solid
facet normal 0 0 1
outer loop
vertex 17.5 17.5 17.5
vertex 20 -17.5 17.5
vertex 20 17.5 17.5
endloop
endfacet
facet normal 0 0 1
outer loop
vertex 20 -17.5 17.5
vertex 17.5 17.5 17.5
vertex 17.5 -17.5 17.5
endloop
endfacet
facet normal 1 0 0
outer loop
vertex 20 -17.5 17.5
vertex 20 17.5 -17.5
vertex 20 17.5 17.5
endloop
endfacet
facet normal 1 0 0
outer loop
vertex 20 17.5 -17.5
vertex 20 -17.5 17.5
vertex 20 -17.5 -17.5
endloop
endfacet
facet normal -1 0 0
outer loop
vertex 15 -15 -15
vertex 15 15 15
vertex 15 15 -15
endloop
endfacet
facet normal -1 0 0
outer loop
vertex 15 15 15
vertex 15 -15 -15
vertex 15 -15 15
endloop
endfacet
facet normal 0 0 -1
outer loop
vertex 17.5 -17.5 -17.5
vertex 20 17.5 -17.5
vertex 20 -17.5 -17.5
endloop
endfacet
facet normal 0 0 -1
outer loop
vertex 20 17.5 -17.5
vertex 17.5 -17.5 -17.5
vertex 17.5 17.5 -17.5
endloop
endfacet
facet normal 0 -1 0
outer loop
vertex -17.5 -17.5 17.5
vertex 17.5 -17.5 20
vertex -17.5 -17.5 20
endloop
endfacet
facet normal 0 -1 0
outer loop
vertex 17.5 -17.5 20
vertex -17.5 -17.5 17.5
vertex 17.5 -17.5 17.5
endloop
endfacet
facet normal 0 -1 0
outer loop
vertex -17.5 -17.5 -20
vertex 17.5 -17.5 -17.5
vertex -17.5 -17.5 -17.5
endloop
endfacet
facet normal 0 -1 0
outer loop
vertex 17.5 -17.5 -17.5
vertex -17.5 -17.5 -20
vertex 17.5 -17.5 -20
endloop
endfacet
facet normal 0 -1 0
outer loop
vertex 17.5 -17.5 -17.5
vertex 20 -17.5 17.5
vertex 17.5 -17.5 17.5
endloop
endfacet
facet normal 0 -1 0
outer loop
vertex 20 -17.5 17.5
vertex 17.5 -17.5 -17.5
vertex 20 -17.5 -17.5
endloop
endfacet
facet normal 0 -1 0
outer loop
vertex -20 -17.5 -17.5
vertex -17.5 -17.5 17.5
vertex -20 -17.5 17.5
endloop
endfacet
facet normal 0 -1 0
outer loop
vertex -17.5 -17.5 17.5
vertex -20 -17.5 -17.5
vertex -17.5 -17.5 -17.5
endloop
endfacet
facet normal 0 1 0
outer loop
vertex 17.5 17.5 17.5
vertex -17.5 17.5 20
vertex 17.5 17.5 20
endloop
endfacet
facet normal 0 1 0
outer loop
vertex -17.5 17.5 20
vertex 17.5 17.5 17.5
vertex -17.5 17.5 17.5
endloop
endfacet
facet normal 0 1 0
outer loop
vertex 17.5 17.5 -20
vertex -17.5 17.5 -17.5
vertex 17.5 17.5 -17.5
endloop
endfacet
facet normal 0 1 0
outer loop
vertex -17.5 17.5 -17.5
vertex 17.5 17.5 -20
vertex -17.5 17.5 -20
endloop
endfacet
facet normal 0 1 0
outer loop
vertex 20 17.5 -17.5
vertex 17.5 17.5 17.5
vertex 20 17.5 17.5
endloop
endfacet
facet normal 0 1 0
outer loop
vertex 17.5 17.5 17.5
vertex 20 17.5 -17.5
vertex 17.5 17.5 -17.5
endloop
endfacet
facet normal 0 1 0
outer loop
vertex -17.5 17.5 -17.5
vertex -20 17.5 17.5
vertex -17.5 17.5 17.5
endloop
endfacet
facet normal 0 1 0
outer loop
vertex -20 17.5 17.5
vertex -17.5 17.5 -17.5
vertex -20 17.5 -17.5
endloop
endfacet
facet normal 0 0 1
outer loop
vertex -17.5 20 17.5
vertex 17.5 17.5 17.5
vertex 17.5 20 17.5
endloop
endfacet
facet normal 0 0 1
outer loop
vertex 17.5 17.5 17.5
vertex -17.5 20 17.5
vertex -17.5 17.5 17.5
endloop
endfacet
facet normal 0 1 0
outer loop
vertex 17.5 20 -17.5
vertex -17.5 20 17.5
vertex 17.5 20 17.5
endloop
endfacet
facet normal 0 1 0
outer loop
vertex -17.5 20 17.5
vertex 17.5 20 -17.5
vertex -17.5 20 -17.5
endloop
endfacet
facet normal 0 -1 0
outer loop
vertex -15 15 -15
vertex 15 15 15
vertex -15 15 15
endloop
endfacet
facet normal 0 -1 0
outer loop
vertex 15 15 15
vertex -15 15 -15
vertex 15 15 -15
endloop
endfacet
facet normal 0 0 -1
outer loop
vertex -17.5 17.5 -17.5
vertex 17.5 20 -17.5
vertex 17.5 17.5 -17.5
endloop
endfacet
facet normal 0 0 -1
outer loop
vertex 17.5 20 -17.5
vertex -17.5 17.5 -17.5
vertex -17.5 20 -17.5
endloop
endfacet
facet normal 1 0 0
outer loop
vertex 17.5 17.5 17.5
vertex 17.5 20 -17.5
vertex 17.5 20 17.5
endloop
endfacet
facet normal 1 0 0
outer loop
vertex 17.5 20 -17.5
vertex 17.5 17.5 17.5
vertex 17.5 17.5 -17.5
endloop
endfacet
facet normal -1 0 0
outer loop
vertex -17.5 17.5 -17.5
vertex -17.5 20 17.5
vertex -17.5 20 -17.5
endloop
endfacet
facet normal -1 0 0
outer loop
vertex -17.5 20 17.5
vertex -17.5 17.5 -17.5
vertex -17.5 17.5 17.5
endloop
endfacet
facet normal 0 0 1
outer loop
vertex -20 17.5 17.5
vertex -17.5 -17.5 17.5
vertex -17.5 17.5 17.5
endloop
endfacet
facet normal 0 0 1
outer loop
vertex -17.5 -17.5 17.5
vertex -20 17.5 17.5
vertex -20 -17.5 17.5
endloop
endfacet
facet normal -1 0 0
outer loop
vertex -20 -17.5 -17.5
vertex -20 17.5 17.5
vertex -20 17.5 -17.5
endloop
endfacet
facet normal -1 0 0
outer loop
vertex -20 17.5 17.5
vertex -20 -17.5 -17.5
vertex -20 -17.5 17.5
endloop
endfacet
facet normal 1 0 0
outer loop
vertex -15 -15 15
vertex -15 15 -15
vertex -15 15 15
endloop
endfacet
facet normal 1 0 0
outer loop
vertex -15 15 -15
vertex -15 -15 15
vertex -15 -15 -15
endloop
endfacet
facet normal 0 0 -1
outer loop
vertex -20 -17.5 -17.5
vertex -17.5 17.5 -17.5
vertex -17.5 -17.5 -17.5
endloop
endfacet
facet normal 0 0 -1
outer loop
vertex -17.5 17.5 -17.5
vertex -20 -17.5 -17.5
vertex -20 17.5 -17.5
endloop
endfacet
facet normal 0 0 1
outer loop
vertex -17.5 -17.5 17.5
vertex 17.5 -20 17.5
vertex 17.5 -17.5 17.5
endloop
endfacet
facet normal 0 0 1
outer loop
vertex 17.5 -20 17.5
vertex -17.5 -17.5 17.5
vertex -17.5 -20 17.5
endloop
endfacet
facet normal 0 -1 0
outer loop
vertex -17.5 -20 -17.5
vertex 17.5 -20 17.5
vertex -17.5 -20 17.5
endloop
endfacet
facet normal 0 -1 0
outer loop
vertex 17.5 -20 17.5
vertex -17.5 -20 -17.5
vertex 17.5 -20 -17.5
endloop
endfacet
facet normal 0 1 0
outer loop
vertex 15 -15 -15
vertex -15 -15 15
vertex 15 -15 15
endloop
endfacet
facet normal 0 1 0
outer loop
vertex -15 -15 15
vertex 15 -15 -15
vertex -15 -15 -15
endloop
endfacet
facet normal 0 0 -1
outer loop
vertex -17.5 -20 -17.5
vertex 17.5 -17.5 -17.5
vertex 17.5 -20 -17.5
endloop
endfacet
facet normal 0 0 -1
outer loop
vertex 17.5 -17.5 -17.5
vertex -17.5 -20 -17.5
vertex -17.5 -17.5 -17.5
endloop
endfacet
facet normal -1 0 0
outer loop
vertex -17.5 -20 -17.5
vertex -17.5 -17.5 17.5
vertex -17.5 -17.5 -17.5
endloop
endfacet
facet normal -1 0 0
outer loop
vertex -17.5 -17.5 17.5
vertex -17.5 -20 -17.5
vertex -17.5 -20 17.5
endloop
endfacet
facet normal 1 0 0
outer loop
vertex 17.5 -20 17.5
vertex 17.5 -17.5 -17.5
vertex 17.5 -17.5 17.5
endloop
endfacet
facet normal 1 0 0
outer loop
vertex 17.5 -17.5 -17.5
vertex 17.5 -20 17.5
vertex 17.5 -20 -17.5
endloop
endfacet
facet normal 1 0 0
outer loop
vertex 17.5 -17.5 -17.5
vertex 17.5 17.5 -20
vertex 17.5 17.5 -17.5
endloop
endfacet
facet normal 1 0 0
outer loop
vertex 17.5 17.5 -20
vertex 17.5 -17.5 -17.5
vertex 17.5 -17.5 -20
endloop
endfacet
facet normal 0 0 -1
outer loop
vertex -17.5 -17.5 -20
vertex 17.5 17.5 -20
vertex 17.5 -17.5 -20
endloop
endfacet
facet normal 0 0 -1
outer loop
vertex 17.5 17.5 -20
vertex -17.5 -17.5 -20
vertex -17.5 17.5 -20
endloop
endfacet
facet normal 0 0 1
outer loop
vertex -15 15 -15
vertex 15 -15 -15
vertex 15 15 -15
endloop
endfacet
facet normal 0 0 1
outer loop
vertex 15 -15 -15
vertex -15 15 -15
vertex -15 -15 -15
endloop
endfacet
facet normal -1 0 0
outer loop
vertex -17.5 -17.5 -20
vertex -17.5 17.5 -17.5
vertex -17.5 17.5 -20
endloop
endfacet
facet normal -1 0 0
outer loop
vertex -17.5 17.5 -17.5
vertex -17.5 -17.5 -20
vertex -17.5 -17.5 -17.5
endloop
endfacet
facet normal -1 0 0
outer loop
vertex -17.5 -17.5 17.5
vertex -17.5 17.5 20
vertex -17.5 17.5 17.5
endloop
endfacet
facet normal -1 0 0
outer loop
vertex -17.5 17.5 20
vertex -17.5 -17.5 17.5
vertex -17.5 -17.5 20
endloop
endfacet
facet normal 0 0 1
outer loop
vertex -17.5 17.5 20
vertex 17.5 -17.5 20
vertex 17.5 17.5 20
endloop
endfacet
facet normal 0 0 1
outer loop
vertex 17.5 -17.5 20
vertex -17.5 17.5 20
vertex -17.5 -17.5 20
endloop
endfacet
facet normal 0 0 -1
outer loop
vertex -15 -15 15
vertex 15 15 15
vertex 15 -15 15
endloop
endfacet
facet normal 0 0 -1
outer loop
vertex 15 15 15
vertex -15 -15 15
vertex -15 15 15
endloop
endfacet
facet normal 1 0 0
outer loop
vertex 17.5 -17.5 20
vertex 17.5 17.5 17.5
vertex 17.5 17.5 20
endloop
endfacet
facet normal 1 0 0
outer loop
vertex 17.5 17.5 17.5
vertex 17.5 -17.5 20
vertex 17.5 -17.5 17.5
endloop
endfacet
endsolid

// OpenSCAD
// file: modules.scad
module noir(filename,text)
{
    rotate([0,0,180])
     difference() 
     {   
        union()
        { 
            translate([5,0,0])  cube([35,35,5],center=true); 
//            translate([22.5,0,0])  cube([2,2,5],center=true); 
        }
        translate([3,0,4.6])    scale([0.14,0.14,-0.03])  surface(file = filename, center = true);
        translate([22.0,-7.2,1.5])   rotate([0,0,90])  linear_extrude(4)  text (text, font="Ubuntu Mono:style=Bold", $fn=50,size= 4);
     } 
}

module blanc (filename,text)
{
    rotate([0,0,180])        
    intersection() 
    {    
        translate([5,0,0])  cube([35,35,5],center=true); 
        union(){ 
                translate([3,0,4.6])    scale([0.14,0.14,-0.03])  surface(file = filename, center = true); 
                translate([22.0,-7.2,1.5])   rotate([0,0,90])  linear_extrude(4)  text (text, font="Ubuntu Mono:style=Bold", $fn=50,size= 4); 
        } 
    } 
}

module shape ()
{
    rotate([0,0,180])   translate([5,0,0])  cube([35.5,35.5,5],center=true); 
//    rotate([0,0,180])   translate([22.5,0,0])  cube([2.5,2.5,5],center=true); 
}
// main file
include <modules.scad>


ref=0;
file0 = str("markers/Marker",str(ref),".png");
nb0 = ref;
file1 = str("markers/Marker",str(ref+1),".png");
nb1 = ref+1;
file2 = str("markers/Marker",str(ref+2),".png");
nb2 = ref+2;
file3 = str("markers/Marker",str(ref+3),".png");
nb3 = ref+3;
file4 = str("markers/Marker",str(ref+4),".png");
nb4 = ref+4;
file5 = str("markers/Marker",str(ref+5),".png");
nb5 = ref+5;


echo(file0)
echo(file1)
echo(file2)
echo(file3)
echo(file4)
echo(file5)

// partie noire
color([0,0,0])      union()
{
    translate([35/2,0,-5]) rotate([0,90,0])    noir (file0,nb0);
    rotate([0,0,90])    translate([35/2,0,-5]) rotate([0,90,0])    noir (file1,nb1);
    rotate([0,0,180])    translate([35/2,0,-5]) rotate([0,90,0])   noir (file2,nb2);
    rotate([0,0,270])    translate([35/2,0,-5]) rotate([0,90,0])   noir (file3,nb3);
    rotate([0,90,0])    translate([35/2,0,-5]) rotate([0,90,0])    noir (file4,nb4);
    rotate([0,270,0])    translate([35/2,0,-5]) rotate([0,90,0])   noir (file5,nb5);
}
